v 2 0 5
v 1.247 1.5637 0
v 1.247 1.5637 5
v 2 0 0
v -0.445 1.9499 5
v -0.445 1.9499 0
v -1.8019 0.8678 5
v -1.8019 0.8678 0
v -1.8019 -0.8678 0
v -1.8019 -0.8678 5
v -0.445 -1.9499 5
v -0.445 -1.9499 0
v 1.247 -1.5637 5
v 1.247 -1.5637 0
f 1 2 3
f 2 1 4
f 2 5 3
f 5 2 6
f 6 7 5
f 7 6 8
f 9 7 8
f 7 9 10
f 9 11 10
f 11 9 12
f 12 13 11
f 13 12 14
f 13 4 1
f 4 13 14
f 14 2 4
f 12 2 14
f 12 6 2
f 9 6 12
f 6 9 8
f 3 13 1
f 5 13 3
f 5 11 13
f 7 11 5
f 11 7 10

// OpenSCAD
union() {
  translate([0, 0, 0]) cylinder(h=5, r=2, center=false);
}
